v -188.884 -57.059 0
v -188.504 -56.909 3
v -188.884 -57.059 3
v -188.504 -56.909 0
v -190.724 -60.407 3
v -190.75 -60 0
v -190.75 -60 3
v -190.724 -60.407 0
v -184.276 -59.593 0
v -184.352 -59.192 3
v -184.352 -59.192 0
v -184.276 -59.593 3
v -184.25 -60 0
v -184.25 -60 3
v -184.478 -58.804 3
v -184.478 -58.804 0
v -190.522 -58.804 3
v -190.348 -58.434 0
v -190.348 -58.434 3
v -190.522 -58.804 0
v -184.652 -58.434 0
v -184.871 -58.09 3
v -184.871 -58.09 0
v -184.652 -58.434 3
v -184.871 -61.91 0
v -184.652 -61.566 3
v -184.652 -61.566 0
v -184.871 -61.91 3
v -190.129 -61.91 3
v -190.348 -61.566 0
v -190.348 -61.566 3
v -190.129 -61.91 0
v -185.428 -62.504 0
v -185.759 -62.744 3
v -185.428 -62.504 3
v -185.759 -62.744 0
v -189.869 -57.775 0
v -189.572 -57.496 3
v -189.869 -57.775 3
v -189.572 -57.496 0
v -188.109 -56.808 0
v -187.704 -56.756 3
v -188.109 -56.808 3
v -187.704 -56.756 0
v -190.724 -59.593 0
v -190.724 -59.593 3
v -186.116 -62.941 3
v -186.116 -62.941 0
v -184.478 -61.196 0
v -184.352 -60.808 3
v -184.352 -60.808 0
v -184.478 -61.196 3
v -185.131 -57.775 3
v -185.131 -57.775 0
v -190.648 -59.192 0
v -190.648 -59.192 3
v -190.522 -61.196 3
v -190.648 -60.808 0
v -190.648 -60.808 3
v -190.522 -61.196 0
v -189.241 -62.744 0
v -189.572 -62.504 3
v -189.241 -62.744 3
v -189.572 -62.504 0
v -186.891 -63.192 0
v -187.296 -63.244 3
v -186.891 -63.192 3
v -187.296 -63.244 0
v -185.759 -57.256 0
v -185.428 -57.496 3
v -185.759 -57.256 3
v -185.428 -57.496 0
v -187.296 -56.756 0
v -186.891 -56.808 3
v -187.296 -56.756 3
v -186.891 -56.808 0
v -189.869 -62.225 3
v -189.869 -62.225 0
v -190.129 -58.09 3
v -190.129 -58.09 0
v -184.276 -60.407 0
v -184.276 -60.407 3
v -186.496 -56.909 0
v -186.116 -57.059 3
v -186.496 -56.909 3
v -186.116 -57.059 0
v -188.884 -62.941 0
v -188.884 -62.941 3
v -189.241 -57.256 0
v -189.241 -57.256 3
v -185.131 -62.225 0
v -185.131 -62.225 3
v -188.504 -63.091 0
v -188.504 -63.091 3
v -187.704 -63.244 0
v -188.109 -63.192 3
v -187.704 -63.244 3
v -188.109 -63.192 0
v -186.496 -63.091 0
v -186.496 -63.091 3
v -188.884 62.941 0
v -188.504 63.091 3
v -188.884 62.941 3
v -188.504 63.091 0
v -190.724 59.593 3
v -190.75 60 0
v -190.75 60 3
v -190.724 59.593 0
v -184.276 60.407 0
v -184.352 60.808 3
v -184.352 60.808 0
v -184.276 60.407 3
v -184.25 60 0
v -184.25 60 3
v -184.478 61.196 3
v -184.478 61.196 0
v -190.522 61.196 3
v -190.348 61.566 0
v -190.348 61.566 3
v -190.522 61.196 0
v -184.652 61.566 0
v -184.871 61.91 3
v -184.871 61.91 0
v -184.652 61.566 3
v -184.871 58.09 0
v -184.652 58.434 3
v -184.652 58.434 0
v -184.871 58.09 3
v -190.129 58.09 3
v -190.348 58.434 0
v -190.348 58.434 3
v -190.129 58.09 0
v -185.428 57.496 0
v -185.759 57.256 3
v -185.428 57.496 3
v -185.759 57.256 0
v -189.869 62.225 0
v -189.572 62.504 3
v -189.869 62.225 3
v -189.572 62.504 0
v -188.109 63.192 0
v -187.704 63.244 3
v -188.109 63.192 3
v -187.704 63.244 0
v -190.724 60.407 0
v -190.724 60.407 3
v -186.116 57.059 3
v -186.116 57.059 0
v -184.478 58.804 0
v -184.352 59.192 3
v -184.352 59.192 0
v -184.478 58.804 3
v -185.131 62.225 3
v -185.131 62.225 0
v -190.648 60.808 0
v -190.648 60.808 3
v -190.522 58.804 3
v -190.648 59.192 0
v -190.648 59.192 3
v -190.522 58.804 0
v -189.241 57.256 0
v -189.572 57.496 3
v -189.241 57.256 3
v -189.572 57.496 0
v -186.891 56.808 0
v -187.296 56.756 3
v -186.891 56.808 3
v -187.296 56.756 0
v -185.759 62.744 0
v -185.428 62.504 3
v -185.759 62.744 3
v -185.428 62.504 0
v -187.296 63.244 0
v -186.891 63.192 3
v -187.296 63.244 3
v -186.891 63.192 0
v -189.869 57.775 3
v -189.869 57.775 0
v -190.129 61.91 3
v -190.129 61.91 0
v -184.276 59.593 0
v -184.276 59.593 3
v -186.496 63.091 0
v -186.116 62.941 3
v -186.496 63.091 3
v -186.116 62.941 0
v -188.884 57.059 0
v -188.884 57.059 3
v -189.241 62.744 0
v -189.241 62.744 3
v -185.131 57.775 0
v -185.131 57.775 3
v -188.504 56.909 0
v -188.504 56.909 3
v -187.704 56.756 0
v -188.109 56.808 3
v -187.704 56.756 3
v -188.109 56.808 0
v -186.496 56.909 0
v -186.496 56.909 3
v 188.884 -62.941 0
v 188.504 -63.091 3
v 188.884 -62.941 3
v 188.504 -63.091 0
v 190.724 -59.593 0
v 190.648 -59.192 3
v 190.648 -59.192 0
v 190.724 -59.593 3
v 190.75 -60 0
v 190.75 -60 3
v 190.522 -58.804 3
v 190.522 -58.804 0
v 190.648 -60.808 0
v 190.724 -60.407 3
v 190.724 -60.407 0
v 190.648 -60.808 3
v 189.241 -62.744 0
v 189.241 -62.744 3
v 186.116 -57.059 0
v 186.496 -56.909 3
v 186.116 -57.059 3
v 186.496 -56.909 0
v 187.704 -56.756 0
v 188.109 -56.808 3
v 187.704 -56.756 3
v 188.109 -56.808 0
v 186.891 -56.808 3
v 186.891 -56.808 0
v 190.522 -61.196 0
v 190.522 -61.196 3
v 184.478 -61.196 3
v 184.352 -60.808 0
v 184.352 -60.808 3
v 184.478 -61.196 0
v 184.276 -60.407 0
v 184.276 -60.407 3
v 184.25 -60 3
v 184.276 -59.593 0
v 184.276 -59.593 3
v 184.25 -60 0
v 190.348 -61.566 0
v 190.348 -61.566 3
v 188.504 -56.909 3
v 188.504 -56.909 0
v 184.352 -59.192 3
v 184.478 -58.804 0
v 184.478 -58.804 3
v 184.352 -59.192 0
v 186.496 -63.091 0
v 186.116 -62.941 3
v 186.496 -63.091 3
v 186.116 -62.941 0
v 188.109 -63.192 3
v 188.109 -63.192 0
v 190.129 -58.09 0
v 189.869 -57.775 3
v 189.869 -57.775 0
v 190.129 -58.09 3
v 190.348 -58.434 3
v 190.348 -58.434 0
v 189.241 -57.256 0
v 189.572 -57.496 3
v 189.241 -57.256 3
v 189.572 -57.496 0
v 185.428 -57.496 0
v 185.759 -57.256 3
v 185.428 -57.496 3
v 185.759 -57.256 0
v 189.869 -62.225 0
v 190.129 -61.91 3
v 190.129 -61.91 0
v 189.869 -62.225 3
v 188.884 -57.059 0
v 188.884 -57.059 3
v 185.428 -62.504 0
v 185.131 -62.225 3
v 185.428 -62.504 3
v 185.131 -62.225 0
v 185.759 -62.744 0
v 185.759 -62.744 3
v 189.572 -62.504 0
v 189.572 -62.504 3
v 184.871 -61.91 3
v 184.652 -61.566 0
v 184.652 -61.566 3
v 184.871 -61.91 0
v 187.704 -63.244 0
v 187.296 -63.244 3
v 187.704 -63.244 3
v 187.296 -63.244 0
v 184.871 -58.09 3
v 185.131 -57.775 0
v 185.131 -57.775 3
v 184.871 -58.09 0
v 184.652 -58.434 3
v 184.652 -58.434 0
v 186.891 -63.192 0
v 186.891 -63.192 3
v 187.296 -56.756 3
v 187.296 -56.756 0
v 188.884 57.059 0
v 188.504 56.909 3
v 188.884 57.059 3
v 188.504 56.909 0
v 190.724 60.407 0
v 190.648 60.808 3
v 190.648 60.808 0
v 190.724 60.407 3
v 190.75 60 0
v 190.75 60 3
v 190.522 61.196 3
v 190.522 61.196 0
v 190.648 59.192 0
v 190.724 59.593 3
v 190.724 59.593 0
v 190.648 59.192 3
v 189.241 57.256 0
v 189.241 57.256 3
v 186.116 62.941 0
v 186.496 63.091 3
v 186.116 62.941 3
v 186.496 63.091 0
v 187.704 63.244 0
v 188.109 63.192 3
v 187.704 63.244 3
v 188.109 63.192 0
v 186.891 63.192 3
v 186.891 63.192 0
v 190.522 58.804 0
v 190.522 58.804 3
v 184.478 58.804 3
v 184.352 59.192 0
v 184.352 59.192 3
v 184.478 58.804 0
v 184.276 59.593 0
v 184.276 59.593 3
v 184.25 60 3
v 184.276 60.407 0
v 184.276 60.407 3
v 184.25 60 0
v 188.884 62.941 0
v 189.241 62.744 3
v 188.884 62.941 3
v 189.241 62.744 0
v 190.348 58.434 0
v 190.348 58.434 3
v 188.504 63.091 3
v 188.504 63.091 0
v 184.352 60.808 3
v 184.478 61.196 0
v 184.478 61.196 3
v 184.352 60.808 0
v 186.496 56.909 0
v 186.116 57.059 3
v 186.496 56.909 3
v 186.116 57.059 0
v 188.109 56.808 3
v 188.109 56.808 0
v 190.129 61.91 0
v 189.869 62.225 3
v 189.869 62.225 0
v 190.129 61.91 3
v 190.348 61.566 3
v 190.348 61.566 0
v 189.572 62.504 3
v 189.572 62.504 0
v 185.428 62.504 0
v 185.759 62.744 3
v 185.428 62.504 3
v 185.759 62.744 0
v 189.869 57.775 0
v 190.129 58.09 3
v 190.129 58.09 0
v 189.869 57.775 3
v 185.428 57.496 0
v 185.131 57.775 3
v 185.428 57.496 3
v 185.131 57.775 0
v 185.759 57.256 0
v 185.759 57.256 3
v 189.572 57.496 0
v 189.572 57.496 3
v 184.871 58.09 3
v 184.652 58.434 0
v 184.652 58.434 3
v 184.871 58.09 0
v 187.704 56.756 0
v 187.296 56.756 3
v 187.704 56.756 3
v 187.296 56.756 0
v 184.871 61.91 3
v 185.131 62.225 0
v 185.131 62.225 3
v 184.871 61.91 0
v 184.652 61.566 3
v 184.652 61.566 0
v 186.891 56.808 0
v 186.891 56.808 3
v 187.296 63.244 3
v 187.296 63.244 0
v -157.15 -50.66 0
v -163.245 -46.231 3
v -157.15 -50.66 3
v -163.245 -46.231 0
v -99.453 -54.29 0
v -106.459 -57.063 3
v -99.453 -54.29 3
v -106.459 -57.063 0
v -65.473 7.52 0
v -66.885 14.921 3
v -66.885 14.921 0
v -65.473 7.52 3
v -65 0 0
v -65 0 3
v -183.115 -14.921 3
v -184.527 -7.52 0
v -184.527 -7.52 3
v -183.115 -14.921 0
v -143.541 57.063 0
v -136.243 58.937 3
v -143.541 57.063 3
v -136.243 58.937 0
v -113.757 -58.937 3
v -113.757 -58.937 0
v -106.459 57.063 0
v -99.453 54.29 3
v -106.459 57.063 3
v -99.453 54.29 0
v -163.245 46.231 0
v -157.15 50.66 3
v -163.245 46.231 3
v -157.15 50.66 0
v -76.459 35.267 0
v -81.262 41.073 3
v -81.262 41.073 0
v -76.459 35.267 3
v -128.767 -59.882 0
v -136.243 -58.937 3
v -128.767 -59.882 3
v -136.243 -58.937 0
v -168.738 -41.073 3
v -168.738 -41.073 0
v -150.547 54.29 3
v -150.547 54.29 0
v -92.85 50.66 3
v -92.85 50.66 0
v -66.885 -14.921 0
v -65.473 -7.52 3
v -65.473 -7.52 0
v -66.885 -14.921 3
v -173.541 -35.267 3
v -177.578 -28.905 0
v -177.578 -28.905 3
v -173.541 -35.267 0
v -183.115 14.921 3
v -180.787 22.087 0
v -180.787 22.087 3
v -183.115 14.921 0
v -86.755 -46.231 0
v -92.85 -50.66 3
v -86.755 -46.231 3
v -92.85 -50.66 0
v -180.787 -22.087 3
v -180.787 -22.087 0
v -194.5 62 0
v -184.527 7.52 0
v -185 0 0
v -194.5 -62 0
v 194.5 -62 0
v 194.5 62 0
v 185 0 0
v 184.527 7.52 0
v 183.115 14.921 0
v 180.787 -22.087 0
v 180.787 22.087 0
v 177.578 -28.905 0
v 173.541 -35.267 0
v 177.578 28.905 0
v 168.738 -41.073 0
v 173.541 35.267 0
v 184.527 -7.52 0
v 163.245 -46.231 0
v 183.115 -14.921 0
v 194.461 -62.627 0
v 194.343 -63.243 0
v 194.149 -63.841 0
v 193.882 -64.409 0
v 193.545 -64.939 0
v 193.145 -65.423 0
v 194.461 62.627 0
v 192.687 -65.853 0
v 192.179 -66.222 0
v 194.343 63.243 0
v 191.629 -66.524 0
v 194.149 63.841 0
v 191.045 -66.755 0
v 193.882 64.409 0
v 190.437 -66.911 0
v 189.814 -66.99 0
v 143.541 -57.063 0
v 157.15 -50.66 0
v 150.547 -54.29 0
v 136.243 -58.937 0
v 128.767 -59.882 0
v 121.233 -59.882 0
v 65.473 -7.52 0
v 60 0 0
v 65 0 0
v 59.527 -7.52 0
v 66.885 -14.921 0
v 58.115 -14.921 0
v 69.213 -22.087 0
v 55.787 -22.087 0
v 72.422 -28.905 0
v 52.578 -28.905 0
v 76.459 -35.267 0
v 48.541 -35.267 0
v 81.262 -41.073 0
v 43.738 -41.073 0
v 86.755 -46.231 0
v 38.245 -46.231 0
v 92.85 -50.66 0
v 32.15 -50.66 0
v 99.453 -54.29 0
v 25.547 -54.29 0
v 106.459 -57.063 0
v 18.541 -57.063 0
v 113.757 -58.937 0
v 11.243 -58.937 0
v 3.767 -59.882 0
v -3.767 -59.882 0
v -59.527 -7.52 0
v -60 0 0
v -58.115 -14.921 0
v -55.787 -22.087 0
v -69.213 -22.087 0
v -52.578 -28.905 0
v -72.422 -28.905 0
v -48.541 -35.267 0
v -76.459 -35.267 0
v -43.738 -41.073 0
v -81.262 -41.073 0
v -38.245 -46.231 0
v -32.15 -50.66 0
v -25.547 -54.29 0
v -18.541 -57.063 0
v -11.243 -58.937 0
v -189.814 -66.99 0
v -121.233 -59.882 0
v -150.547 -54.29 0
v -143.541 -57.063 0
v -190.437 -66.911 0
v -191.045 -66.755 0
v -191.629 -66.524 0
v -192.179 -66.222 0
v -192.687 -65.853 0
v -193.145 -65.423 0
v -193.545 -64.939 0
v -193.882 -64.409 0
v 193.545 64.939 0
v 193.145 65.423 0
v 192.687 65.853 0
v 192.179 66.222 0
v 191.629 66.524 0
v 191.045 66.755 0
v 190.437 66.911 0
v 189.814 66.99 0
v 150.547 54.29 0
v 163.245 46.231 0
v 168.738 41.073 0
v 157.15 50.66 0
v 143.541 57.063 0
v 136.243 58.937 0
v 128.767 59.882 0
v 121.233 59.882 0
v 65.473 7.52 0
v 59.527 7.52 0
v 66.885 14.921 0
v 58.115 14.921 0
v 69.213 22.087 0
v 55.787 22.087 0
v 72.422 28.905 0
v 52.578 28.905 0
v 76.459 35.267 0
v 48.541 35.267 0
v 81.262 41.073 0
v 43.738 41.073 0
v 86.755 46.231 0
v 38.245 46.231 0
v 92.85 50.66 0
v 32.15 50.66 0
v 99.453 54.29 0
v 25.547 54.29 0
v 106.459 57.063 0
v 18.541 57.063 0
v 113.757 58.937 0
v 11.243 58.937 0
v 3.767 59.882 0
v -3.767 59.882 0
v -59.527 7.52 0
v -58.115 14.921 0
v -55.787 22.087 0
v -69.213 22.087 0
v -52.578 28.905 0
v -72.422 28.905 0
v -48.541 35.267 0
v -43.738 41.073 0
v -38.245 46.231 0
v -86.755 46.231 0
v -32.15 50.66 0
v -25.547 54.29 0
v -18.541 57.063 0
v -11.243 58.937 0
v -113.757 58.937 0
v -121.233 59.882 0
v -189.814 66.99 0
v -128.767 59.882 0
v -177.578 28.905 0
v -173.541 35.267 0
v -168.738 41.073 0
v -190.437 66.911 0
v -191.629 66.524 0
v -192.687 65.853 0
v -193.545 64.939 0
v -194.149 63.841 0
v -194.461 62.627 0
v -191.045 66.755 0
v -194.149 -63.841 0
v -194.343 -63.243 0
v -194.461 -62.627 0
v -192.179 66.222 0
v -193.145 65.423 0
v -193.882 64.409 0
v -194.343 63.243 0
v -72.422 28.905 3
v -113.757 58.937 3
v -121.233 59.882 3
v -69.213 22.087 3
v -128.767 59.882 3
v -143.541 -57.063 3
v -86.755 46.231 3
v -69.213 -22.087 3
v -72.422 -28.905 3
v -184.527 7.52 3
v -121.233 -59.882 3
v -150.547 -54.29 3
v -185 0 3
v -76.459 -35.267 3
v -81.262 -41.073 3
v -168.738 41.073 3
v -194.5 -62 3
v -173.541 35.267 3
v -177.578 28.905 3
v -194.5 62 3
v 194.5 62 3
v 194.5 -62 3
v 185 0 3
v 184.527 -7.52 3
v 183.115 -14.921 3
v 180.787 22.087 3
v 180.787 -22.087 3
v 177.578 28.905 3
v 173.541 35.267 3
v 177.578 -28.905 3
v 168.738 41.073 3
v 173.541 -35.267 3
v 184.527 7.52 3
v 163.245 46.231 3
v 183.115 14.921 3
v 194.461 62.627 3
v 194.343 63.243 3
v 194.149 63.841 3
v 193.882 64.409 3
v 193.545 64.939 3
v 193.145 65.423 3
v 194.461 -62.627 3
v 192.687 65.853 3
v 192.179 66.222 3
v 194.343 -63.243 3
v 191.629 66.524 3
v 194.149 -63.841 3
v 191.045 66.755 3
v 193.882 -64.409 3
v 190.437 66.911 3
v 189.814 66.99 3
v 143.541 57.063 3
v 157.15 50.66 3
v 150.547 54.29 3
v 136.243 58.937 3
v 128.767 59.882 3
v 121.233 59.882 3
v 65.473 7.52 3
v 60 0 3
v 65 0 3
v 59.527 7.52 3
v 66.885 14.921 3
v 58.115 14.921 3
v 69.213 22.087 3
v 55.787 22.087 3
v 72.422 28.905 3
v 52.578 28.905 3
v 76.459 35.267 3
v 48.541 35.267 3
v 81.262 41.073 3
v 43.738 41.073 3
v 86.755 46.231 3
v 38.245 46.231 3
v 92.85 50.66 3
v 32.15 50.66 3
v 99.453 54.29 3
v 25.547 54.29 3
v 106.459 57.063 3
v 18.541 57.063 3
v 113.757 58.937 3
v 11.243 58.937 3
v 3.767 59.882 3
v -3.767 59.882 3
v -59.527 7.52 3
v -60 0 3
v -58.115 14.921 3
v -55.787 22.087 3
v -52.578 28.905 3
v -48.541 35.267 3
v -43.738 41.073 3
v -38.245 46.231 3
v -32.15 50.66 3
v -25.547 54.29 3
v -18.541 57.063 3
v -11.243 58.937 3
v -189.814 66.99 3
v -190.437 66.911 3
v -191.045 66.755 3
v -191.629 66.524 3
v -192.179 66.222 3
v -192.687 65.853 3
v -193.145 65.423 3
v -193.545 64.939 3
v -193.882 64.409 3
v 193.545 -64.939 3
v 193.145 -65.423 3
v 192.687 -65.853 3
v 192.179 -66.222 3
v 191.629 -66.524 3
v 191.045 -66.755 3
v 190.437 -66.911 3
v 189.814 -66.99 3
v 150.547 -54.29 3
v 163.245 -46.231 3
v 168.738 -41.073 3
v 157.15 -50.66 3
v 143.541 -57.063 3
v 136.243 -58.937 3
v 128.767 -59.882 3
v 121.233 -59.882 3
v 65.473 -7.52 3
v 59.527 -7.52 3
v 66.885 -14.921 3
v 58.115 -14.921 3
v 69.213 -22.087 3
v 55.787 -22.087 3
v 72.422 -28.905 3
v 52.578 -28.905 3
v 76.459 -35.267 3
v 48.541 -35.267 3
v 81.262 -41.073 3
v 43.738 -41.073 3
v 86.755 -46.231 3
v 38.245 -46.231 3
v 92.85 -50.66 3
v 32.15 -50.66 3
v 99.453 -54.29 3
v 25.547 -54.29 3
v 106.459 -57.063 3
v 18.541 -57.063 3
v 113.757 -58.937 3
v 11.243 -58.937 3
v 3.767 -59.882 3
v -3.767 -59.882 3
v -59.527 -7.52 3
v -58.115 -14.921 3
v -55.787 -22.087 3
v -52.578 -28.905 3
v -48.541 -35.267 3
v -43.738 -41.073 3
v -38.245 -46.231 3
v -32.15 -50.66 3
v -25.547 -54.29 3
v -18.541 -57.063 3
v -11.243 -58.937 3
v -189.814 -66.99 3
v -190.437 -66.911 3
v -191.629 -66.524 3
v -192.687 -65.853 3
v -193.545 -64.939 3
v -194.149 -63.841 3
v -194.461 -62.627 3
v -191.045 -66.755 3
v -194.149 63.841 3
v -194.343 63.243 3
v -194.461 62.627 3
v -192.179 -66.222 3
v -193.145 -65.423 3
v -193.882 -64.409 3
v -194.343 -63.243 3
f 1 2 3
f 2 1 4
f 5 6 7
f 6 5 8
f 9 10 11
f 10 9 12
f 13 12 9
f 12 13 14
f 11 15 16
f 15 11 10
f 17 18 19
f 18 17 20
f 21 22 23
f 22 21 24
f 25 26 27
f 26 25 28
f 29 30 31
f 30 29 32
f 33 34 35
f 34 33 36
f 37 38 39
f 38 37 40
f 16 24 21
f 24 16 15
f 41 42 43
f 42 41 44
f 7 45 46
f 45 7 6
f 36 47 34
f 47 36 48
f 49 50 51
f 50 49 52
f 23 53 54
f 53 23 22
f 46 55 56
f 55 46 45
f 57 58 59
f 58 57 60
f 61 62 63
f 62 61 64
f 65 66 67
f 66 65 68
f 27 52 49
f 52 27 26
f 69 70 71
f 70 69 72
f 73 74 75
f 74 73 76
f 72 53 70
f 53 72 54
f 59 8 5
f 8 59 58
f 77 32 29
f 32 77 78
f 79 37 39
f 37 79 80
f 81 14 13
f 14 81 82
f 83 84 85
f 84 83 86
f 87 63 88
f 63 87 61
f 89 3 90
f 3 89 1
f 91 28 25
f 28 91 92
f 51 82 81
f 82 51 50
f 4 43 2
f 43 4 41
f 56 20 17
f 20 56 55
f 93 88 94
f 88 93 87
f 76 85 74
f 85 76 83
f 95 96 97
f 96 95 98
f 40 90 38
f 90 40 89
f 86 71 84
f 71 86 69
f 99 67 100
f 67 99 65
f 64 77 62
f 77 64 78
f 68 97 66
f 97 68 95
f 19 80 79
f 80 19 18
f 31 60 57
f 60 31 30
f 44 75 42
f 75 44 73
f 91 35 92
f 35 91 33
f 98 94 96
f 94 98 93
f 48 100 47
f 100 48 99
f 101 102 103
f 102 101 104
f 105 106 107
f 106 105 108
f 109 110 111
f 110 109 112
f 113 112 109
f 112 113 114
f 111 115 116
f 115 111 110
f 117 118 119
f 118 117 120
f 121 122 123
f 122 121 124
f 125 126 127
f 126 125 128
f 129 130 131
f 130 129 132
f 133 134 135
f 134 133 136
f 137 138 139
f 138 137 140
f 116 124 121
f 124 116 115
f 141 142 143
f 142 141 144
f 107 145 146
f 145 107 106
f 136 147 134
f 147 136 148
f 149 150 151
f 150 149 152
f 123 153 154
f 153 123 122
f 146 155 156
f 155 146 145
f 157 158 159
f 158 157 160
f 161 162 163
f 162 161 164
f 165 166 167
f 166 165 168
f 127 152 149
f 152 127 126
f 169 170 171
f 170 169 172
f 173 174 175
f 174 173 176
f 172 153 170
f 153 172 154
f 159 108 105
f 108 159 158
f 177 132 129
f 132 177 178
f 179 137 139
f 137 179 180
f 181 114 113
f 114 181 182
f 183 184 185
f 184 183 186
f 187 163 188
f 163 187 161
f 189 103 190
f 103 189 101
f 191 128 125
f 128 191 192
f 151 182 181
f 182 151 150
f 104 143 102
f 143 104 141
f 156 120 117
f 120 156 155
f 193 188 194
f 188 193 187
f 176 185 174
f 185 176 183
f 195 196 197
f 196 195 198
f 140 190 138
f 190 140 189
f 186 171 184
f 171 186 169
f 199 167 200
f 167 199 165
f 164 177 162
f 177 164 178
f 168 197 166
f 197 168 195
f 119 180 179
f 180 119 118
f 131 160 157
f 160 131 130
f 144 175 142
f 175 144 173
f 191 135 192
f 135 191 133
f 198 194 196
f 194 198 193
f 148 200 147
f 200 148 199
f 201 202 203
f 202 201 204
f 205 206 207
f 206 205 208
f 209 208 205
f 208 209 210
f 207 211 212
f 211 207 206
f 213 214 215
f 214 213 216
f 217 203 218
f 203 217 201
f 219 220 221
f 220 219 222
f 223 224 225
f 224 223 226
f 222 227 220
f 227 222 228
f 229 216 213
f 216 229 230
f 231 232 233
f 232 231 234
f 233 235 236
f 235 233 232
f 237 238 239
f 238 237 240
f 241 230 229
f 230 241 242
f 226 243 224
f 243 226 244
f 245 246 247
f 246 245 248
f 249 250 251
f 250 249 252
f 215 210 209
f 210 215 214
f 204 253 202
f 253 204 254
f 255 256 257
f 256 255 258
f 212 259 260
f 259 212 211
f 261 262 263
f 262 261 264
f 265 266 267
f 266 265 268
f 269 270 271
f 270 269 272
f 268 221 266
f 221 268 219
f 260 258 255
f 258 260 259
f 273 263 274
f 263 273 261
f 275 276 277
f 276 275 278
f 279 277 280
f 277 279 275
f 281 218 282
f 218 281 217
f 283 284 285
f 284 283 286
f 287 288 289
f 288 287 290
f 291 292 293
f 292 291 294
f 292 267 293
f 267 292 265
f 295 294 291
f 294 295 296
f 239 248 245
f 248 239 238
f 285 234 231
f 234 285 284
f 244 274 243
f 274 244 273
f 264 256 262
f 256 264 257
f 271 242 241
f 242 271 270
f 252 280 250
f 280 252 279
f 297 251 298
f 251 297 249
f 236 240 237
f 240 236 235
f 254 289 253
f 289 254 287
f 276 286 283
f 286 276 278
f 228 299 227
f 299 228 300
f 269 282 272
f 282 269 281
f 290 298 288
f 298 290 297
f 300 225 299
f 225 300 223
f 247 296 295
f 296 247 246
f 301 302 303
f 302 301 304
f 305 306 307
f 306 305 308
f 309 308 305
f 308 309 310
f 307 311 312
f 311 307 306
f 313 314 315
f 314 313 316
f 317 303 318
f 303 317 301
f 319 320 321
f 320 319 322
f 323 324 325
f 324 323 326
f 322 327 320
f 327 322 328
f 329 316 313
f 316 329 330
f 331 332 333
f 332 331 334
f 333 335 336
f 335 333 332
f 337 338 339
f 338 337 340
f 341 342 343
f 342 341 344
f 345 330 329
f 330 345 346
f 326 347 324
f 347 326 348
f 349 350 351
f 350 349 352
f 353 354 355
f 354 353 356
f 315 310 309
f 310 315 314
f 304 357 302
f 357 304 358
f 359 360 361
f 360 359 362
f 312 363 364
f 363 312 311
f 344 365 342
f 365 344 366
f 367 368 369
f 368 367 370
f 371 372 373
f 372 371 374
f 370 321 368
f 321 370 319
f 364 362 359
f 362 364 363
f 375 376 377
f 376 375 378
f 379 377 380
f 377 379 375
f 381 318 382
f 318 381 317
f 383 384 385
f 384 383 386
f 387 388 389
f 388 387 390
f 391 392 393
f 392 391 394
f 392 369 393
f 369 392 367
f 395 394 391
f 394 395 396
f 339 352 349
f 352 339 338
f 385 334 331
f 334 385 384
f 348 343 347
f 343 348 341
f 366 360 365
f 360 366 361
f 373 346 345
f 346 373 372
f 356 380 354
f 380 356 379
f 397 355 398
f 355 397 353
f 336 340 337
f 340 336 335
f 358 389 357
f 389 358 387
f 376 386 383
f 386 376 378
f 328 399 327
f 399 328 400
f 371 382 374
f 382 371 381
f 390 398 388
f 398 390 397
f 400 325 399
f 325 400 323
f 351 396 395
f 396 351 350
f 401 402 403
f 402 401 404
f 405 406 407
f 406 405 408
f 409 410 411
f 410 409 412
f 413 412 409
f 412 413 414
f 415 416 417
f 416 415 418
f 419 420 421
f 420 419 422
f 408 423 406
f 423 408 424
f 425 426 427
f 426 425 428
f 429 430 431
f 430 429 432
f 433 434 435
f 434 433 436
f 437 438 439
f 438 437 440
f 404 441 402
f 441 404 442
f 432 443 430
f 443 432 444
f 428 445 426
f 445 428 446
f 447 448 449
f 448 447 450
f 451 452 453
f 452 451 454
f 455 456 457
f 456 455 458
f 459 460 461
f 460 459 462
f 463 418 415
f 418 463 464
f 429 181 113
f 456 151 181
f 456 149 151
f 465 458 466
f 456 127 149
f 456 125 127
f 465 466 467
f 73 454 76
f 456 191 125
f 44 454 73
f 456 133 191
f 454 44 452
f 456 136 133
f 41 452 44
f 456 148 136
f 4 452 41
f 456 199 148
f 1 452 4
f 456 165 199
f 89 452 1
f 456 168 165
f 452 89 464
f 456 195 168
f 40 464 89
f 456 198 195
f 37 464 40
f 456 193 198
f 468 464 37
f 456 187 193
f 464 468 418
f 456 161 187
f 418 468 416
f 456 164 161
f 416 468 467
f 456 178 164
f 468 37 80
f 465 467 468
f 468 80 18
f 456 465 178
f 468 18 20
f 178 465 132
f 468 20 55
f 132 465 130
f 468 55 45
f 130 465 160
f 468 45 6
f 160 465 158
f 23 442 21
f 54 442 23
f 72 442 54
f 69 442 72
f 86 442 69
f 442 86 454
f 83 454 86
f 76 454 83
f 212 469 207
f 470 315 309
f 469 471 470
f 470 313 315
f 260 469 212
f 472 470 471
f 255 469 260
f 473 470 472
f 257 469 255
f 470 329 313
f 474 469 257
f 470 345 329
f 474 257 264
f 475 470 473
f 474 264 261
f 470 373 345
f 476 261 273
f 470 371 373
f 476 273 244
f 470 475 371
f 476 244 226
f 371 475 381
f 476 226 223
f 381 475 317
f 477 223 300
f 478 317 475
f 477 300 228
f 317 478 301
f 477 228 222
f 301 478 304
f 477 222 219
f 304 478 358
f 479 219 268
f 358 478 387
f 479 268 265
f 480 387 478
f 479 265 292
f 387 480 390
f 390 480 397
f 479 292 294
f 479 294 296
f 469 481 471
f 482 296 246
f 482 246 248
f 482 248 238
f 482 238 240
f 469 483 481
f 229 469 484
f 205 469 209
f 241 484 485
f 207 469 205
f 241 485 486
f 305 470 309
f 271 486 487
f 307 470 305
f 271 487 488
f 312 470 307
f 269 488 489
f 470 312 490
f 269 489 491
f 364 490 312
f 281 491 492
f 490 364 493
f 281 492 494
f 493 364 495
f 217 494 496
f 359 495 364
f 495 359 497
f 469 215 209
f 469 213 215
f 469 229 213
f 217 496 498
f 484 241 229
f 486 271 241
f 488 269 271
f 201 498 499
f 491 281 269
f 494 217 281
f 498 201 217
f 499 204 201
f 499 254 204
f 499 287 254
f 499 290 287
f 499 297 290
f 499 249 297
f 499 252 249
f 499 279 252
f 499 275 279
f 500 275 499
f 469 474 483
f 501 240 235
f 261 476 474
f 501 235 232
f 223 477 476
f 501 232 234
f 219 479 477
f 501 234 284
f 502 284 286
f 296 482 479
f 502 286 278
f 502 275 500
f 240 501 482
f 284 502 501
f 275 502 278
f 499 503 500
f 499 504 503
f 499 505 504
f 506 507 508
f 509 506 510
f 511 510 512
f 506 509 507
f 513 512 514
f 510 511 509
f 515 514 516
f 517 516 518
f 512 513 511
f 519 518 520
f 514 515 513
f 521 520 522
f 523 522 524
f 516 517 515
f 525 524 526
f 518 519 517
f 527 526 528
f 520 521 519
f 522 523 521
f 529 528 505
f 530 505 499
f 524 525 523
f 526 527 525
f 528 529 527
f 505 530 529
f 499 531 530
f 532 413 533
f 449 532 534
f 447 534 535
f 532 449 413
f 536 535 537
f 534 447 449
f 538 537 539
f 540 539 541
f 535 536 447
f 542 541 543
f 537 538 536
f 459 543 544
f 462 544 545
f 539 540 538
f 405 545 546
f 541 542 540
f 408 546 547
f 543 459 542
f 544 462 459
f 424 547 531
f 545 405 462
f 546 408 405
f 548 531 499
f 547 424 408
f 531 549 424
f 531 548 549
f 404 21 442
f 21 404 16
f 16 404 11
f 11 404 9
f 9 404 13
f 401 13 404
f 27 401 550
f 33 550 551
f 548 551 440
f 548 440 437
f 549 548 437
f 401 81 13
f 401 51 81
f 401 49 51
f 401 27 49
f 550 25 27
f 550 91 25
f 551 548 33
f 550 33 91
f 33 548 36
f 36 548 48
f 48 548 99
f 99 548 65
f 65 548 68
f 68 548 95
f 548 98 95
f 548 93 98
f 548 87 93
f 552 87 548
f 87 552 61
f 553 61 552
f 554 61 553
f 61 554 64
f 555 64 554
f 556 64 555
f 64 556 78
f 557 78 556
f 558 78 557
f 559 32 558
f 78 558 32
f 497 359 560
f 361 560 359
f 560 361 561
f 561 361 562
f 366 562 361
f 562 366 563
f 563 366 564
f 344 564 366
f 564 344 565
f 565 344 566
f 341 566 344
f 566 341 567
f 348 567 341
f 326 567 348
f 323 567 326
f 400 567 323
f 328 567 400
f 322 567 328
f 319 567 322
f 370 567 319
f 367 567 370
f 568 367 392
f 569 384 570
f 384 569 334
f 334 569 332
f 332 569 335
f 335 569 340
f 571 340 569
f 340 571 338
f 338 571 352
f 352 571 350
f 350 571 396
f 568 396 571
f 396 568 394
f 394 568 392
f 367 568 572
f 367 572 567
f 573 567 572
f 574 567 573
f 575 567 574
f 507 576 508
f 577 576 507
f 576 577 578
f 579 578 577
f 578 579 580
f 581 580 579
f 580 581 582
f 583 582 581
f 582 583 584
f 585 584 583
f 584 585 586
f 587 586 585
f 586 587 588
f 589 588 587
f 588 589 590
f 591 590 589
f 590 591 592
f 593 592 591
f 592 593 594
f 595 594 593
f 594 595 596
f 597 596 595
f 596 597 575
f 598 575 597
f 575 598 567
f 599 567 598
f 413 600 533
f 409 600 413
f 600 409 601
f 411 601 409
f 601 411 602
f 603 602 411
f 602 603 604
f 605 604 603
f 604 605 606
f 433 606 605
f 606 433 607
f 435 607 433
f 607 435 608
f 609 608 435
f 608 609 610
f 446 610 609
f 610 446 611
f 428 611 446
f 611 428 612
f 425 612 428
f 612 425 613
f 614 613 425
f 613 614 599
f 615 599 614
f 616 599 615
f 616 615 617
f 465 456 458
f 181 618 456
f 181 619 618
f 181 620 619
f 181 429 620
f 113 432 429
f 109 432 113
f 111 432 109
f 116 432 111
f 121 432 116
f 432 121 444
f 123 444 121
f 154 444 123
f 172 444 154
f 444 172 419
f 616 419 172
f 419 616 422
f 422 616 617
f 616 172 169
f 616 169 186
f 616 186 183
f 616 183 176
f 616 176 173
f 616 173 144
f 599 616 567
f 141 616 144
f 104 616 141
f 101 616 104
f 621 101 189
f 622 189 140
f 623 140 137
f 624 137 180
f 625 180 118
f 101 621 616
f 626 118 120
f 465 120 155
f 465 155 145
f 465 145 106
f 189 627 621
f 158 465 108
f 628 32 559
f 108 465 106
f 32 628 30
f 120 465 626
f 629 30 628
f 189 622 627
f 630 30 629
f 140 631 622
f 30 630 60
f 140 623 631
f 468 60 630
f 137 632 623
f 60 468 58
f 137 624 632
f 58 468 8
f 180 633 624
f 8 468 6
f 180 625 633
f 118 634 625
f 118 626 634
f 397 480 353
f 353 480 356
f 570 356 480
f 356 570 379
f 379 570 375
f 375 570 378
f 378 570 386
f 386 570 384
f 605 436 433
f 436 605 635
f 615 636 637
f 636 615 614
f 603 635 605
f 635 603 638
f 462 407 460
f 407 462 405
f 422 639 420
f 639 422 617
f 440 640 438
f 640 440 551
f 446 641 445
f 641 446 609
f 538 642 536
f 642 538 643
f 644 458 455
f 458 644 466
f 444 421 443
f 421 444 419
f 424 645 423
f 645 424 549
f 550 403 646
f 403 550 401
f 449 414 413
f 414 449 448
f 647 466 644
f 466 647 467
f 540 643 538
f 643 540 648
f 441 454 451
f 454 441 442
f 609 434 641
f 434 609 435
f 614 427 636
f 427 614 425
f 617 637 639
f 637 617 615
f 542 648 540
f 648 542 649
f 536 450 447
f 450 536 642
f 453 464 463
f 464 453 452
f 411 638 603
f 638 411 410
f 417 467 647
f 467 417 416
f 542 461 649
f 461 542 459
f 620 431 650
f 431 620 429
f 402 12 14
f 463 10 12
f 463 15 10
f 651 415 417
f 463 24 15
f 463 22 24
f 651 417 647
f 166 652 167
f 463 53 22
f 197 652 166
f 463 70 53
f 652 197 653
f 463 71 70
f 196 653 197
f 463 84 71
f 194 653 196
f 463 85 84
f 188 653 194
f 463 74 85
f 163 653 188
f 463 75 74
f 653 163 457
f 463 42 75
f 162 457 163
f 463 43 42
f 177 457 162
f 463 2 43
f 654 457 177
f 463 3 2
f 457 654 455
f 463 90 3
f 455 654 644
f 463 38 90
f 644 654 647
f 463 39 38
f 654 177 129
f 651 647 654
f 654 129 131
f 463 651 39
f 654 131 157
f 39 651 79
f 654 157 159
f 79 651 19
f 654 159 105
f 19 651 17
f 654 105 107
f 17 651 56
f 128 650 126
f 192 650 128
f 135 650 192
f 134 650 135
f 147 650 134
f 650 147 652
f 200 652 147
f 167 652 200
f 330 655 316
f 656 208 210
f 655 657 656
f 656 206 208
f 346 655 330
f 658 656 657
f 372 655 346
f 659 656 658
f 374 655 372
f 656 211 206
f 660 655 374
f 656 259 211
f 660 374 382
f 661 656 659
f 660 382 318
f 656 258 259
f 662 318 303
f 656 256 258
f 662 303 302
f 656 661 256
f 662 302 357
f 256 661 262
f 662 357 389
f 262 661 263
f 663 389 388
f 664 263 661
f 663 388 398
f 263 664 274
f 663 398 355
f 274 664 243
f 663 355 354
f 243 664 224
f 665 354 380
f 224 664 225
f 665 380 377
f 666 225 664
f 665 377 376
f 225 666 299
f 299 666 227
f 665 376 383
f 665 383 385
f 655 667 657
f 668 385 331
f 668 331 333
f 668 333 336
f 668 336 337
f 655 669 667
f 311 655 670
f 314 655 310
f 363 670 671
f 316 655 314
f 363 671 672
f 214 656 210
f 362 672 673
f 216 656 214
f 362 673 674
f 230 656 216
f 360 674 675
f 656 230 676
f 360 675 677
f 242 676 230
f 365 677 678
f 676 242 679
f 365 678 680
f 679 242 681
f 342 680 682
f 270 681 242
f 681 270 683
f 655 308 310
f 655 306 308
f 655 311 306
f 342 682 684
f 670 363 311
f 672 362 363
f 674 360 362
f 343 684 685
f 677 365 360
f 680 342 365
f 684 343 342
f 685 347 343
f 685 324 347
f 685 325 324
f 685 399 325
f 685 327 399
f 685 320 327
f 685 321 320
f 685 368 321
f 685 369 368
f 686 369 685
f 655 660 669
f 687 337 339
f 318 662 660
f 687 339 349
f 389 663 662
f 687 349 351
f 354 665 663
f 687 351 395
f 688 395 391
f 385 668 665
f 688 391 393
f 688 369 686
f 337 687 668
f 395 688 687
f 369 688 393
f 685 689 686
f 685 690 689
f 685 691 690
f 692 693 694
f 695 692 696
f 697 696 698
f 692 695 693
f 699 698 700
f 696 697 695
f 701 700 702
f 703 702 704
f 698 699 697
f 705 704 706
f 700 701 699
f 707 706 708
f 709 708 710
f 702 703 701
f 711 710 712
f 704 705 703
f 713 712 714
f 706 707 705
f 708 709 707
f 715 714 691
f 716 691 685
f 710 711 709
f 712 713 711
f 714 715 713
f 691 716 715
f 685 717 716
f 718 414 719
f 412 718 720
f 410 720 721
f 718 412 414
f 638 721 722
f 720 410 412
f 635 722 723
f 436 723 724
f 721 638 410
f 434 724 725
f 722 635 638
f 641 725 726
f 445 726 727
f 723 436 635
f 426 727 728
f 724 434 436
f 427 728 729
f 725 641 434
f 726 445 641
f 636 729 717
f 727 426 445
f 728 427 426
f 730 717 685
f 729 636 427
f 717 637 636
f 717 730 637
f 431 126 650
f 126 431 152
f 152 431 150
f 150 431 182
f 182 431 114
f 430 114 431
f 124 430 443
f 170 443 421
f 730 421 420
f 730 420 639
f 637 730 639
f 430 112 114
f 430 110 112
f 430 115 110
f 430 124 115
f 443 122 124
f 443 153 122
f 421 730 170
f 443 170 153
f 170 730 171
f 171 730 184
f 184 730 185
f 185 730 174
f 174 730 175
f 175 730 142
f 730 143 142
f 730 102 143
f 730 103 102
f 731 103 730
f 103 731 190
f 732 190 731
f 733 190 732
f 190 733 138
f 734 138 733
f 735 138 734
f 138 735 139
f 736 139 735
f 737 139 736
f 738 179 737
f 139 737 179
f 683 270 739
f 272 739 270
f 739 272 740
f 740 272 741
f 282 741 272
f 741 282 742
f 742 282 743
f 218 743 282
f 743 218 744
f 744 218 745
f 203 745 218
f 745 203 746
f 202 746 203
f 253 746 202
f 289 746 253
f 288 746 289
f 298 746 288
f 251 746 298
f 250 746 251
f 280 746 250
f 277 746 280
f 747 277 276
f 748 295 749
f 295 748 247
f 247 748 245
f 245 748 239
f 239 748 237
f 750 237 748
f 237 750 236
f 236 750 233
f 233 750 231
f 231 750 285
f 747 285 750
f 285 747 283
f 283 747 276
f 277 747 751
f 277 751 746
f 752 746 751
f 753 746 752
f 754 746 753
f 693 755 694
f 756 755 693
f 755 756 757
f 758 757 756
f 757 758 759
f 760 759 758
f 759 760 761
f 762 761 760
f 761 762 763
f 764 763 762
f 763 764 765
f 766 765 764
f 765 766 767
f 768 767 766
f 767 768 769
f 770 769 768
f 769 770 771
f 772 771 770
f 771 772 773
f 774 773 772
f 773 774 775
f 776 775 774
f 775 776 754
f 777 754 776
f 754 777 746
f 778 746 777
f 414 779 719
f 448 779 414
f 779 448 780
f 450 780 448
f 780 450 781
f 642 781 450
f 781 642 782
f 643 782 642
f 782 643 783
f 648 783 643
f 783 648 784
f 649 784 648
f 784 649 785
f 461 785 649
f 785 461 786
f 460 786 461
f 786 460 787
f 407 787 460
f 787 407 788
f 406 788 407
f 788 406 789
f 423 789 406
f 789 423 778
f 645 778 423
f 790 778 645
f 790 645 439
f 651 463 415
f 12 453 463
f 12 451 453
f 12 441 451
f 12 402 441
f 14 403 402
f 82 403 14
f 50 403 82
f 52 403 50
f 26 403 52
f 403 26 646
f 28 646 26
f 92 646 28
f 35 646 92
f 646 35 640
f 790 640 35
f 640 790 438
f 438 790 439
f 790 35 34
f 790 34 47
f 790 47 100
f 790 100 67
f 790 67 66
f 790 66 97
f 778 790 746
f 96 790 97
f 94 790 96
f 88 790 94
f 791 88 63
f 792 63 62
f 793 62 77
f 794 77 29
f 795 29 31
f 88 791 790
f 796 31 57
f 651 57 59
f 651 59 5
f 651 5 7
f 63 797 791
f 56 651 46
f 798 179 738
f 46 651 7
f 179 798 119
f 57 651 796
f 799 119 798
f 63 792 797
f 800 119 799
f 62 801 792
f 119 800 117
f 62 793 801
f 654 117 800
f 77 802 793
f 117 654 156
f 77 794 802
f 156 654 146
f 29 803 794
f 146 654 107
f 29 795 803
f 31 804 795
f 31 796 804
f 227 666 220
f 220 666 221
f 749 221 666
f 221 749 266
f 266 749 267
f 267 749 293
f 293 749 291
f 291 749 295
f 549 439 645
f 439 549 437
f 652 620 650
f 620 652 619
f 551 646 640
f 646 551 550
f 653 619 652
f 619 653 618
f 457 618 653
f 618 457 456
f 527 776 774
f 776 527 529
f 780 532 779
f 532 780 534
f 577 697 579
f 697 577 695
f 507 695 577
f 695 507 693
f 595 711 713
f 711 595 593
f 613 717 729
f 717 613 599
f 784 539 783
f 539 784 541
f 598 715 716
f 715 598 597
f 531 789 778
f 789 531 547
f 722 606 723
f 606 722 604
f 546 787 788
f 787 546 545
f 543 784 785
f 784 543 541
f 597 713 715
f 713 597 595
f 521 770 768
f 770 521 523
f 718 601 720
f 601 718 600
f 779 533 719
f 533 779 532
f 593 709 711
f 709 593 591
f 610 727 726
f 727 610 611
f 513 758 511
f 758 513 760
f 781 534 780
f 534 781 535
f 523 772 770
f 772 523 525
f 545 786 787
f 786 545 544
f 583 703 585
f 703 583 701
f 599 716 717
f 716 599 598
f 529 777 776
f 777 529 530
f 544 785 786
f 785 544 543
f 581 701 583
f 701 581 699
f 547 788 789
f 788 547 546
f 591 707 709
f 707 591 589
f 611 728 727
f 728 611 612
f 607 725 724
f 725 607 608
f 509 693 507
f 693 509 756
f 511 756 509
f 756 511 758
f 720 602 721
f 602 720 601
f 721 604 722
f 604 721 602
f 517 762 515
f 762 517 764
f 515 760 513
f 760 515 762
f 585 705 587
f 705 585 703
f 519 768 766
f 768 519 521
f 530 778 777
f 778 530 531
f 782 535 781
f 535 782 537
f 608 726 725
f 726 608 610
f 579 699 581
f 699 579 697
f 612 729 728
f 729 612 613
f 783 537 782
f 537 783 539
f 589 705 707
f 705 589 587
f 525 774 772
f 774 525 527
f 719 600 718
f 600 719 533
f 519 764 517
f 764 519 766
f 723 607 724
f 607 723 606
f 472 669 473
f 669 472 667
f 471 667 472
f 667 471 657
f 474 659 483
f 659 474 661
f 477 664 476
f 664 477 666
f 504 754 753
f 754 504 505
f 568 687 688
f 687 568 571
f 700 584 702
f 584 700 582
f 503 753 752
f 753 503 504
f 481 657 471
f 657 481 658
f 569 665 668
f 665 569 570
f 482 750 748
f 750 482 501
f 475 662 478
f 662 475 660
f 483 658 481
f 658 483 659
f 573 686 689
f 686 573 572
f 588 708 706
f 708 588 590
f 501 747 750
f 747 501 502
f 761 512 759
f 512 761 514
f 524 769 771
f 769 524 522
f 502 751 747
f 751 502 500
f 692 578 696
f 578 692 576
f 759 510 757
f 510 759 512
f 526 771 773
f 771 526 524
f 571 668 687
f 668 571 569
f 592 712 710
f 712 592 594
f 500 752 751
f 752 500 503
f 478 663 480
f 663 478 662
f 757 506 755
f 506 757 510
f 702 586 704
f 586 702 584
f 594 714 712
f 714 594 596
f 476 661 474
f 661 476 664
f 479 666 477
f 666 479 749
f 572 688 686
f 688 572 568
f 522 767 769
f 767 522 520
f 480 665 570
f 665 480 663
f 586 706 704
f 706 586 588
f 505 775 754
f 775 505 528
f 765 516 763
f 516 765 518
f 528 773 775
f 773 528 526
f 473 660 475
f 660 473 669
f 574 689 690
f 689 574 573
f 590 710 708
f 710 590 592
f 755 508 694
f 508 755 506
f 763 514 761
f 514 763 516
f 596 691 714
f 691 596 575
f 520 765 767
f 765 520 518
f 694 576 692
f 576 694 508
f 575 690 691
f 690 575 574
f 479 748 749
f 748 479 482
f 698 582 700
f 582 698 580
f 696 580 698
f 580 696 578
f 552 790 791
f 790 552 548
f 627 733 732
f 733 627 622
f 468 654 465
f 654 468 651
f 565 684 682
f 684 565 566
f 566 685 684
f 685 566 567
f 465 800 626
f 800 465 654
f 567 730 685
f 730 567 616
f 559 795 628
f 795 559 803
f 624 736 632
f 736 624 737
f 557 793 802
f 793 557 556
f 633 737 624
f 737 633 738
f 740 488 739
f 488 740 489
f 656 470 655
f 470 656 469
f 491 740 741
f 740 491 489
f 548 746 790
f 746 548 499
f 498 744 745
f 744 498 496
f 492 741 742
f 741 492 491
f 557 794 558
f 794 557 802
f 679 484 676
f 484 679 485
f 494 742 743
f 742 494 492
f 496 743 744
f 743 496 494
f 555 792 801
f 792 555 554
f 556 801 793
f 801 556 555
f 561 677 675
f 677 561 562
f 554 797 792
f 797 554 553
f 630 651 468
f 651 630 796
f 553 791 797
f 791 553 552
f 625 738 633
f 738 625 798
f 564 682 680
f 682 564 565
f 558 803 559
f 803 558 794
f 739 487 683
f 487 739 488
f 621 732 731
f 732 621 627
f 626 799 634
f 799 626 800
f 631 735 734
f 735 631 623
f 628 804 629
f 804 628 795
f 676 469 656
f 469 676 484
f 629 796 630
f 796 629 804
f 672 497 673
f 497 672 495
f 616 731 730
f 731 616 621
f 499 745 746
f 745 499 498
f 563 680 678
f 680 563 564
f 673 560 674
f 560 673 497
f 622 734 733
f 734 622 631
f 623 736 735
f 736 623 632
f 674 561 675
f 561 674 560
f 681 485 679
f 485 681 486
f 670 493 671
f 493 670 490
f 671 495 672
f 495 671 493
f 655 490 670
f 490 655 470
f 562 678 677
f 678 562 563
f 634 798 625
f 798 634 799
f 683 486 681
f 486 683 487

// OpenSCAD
$fn = 50;

difference() {
	union() {
		hull() {
			translate(v = [-189.5, 62.0, 0]) {
				cylinder(h = 3, r = 5);
			}
			translate(v = [189.5, 62.0, 0]) {
				cylinder(h = 3, r = 5);
			}
			translate(v = [-189.5, -62.0, 0]) {
				cylinder(h = 3, r = 5);
			}
			translate(v = [189.5, -62.0, 0]) {
				cylinder(h = 3, r = 5);
			}
		}
	}
	union() {
		translate(v = [-187.5, -60.0, -100.0]) {
			cylinder(h = 200, r = 3.25);
		}
		translate(v = [-187.5, 60.0, -100.0]) {
			cylinder(h = 200, r = 3.25);
		}
		translate(v = [187.5, -60.0, -100.0]) {
			cylinder(h = 200, r = 3.25);
		}
		translate(v = [187.5, 60.0, -100.0]) {
			cylinder(h = 200, r = 3.25);
		}
		translate(v = [-187.5, -60.0, -100.0]) {
			cylinder(h = 200, r = 1.8);
		}
		translate(v = [-187.5, 60.0, -100.0]) {
			cylinder(h = 200, r = 1.8);
		}
		translate(v = [187.5, -60.0, -100.0]) {
			cylinder(h = 200, r = 1.8);
		}
		translate(v = [187.5, 60.0, -100.0]) {
			cylinder(h = 200, r = 1.8);
		}
		translate(v = [-125.0, 0, 0.0]) {
			cylinder(h = 3, r = 60.0);
		}
		cylinder(h = 3, r = 60.0);
		translate(v = [125.0, 0, 0.0]) {
			cylinder(h = 3, r = 60.0);
		}
	}
}
